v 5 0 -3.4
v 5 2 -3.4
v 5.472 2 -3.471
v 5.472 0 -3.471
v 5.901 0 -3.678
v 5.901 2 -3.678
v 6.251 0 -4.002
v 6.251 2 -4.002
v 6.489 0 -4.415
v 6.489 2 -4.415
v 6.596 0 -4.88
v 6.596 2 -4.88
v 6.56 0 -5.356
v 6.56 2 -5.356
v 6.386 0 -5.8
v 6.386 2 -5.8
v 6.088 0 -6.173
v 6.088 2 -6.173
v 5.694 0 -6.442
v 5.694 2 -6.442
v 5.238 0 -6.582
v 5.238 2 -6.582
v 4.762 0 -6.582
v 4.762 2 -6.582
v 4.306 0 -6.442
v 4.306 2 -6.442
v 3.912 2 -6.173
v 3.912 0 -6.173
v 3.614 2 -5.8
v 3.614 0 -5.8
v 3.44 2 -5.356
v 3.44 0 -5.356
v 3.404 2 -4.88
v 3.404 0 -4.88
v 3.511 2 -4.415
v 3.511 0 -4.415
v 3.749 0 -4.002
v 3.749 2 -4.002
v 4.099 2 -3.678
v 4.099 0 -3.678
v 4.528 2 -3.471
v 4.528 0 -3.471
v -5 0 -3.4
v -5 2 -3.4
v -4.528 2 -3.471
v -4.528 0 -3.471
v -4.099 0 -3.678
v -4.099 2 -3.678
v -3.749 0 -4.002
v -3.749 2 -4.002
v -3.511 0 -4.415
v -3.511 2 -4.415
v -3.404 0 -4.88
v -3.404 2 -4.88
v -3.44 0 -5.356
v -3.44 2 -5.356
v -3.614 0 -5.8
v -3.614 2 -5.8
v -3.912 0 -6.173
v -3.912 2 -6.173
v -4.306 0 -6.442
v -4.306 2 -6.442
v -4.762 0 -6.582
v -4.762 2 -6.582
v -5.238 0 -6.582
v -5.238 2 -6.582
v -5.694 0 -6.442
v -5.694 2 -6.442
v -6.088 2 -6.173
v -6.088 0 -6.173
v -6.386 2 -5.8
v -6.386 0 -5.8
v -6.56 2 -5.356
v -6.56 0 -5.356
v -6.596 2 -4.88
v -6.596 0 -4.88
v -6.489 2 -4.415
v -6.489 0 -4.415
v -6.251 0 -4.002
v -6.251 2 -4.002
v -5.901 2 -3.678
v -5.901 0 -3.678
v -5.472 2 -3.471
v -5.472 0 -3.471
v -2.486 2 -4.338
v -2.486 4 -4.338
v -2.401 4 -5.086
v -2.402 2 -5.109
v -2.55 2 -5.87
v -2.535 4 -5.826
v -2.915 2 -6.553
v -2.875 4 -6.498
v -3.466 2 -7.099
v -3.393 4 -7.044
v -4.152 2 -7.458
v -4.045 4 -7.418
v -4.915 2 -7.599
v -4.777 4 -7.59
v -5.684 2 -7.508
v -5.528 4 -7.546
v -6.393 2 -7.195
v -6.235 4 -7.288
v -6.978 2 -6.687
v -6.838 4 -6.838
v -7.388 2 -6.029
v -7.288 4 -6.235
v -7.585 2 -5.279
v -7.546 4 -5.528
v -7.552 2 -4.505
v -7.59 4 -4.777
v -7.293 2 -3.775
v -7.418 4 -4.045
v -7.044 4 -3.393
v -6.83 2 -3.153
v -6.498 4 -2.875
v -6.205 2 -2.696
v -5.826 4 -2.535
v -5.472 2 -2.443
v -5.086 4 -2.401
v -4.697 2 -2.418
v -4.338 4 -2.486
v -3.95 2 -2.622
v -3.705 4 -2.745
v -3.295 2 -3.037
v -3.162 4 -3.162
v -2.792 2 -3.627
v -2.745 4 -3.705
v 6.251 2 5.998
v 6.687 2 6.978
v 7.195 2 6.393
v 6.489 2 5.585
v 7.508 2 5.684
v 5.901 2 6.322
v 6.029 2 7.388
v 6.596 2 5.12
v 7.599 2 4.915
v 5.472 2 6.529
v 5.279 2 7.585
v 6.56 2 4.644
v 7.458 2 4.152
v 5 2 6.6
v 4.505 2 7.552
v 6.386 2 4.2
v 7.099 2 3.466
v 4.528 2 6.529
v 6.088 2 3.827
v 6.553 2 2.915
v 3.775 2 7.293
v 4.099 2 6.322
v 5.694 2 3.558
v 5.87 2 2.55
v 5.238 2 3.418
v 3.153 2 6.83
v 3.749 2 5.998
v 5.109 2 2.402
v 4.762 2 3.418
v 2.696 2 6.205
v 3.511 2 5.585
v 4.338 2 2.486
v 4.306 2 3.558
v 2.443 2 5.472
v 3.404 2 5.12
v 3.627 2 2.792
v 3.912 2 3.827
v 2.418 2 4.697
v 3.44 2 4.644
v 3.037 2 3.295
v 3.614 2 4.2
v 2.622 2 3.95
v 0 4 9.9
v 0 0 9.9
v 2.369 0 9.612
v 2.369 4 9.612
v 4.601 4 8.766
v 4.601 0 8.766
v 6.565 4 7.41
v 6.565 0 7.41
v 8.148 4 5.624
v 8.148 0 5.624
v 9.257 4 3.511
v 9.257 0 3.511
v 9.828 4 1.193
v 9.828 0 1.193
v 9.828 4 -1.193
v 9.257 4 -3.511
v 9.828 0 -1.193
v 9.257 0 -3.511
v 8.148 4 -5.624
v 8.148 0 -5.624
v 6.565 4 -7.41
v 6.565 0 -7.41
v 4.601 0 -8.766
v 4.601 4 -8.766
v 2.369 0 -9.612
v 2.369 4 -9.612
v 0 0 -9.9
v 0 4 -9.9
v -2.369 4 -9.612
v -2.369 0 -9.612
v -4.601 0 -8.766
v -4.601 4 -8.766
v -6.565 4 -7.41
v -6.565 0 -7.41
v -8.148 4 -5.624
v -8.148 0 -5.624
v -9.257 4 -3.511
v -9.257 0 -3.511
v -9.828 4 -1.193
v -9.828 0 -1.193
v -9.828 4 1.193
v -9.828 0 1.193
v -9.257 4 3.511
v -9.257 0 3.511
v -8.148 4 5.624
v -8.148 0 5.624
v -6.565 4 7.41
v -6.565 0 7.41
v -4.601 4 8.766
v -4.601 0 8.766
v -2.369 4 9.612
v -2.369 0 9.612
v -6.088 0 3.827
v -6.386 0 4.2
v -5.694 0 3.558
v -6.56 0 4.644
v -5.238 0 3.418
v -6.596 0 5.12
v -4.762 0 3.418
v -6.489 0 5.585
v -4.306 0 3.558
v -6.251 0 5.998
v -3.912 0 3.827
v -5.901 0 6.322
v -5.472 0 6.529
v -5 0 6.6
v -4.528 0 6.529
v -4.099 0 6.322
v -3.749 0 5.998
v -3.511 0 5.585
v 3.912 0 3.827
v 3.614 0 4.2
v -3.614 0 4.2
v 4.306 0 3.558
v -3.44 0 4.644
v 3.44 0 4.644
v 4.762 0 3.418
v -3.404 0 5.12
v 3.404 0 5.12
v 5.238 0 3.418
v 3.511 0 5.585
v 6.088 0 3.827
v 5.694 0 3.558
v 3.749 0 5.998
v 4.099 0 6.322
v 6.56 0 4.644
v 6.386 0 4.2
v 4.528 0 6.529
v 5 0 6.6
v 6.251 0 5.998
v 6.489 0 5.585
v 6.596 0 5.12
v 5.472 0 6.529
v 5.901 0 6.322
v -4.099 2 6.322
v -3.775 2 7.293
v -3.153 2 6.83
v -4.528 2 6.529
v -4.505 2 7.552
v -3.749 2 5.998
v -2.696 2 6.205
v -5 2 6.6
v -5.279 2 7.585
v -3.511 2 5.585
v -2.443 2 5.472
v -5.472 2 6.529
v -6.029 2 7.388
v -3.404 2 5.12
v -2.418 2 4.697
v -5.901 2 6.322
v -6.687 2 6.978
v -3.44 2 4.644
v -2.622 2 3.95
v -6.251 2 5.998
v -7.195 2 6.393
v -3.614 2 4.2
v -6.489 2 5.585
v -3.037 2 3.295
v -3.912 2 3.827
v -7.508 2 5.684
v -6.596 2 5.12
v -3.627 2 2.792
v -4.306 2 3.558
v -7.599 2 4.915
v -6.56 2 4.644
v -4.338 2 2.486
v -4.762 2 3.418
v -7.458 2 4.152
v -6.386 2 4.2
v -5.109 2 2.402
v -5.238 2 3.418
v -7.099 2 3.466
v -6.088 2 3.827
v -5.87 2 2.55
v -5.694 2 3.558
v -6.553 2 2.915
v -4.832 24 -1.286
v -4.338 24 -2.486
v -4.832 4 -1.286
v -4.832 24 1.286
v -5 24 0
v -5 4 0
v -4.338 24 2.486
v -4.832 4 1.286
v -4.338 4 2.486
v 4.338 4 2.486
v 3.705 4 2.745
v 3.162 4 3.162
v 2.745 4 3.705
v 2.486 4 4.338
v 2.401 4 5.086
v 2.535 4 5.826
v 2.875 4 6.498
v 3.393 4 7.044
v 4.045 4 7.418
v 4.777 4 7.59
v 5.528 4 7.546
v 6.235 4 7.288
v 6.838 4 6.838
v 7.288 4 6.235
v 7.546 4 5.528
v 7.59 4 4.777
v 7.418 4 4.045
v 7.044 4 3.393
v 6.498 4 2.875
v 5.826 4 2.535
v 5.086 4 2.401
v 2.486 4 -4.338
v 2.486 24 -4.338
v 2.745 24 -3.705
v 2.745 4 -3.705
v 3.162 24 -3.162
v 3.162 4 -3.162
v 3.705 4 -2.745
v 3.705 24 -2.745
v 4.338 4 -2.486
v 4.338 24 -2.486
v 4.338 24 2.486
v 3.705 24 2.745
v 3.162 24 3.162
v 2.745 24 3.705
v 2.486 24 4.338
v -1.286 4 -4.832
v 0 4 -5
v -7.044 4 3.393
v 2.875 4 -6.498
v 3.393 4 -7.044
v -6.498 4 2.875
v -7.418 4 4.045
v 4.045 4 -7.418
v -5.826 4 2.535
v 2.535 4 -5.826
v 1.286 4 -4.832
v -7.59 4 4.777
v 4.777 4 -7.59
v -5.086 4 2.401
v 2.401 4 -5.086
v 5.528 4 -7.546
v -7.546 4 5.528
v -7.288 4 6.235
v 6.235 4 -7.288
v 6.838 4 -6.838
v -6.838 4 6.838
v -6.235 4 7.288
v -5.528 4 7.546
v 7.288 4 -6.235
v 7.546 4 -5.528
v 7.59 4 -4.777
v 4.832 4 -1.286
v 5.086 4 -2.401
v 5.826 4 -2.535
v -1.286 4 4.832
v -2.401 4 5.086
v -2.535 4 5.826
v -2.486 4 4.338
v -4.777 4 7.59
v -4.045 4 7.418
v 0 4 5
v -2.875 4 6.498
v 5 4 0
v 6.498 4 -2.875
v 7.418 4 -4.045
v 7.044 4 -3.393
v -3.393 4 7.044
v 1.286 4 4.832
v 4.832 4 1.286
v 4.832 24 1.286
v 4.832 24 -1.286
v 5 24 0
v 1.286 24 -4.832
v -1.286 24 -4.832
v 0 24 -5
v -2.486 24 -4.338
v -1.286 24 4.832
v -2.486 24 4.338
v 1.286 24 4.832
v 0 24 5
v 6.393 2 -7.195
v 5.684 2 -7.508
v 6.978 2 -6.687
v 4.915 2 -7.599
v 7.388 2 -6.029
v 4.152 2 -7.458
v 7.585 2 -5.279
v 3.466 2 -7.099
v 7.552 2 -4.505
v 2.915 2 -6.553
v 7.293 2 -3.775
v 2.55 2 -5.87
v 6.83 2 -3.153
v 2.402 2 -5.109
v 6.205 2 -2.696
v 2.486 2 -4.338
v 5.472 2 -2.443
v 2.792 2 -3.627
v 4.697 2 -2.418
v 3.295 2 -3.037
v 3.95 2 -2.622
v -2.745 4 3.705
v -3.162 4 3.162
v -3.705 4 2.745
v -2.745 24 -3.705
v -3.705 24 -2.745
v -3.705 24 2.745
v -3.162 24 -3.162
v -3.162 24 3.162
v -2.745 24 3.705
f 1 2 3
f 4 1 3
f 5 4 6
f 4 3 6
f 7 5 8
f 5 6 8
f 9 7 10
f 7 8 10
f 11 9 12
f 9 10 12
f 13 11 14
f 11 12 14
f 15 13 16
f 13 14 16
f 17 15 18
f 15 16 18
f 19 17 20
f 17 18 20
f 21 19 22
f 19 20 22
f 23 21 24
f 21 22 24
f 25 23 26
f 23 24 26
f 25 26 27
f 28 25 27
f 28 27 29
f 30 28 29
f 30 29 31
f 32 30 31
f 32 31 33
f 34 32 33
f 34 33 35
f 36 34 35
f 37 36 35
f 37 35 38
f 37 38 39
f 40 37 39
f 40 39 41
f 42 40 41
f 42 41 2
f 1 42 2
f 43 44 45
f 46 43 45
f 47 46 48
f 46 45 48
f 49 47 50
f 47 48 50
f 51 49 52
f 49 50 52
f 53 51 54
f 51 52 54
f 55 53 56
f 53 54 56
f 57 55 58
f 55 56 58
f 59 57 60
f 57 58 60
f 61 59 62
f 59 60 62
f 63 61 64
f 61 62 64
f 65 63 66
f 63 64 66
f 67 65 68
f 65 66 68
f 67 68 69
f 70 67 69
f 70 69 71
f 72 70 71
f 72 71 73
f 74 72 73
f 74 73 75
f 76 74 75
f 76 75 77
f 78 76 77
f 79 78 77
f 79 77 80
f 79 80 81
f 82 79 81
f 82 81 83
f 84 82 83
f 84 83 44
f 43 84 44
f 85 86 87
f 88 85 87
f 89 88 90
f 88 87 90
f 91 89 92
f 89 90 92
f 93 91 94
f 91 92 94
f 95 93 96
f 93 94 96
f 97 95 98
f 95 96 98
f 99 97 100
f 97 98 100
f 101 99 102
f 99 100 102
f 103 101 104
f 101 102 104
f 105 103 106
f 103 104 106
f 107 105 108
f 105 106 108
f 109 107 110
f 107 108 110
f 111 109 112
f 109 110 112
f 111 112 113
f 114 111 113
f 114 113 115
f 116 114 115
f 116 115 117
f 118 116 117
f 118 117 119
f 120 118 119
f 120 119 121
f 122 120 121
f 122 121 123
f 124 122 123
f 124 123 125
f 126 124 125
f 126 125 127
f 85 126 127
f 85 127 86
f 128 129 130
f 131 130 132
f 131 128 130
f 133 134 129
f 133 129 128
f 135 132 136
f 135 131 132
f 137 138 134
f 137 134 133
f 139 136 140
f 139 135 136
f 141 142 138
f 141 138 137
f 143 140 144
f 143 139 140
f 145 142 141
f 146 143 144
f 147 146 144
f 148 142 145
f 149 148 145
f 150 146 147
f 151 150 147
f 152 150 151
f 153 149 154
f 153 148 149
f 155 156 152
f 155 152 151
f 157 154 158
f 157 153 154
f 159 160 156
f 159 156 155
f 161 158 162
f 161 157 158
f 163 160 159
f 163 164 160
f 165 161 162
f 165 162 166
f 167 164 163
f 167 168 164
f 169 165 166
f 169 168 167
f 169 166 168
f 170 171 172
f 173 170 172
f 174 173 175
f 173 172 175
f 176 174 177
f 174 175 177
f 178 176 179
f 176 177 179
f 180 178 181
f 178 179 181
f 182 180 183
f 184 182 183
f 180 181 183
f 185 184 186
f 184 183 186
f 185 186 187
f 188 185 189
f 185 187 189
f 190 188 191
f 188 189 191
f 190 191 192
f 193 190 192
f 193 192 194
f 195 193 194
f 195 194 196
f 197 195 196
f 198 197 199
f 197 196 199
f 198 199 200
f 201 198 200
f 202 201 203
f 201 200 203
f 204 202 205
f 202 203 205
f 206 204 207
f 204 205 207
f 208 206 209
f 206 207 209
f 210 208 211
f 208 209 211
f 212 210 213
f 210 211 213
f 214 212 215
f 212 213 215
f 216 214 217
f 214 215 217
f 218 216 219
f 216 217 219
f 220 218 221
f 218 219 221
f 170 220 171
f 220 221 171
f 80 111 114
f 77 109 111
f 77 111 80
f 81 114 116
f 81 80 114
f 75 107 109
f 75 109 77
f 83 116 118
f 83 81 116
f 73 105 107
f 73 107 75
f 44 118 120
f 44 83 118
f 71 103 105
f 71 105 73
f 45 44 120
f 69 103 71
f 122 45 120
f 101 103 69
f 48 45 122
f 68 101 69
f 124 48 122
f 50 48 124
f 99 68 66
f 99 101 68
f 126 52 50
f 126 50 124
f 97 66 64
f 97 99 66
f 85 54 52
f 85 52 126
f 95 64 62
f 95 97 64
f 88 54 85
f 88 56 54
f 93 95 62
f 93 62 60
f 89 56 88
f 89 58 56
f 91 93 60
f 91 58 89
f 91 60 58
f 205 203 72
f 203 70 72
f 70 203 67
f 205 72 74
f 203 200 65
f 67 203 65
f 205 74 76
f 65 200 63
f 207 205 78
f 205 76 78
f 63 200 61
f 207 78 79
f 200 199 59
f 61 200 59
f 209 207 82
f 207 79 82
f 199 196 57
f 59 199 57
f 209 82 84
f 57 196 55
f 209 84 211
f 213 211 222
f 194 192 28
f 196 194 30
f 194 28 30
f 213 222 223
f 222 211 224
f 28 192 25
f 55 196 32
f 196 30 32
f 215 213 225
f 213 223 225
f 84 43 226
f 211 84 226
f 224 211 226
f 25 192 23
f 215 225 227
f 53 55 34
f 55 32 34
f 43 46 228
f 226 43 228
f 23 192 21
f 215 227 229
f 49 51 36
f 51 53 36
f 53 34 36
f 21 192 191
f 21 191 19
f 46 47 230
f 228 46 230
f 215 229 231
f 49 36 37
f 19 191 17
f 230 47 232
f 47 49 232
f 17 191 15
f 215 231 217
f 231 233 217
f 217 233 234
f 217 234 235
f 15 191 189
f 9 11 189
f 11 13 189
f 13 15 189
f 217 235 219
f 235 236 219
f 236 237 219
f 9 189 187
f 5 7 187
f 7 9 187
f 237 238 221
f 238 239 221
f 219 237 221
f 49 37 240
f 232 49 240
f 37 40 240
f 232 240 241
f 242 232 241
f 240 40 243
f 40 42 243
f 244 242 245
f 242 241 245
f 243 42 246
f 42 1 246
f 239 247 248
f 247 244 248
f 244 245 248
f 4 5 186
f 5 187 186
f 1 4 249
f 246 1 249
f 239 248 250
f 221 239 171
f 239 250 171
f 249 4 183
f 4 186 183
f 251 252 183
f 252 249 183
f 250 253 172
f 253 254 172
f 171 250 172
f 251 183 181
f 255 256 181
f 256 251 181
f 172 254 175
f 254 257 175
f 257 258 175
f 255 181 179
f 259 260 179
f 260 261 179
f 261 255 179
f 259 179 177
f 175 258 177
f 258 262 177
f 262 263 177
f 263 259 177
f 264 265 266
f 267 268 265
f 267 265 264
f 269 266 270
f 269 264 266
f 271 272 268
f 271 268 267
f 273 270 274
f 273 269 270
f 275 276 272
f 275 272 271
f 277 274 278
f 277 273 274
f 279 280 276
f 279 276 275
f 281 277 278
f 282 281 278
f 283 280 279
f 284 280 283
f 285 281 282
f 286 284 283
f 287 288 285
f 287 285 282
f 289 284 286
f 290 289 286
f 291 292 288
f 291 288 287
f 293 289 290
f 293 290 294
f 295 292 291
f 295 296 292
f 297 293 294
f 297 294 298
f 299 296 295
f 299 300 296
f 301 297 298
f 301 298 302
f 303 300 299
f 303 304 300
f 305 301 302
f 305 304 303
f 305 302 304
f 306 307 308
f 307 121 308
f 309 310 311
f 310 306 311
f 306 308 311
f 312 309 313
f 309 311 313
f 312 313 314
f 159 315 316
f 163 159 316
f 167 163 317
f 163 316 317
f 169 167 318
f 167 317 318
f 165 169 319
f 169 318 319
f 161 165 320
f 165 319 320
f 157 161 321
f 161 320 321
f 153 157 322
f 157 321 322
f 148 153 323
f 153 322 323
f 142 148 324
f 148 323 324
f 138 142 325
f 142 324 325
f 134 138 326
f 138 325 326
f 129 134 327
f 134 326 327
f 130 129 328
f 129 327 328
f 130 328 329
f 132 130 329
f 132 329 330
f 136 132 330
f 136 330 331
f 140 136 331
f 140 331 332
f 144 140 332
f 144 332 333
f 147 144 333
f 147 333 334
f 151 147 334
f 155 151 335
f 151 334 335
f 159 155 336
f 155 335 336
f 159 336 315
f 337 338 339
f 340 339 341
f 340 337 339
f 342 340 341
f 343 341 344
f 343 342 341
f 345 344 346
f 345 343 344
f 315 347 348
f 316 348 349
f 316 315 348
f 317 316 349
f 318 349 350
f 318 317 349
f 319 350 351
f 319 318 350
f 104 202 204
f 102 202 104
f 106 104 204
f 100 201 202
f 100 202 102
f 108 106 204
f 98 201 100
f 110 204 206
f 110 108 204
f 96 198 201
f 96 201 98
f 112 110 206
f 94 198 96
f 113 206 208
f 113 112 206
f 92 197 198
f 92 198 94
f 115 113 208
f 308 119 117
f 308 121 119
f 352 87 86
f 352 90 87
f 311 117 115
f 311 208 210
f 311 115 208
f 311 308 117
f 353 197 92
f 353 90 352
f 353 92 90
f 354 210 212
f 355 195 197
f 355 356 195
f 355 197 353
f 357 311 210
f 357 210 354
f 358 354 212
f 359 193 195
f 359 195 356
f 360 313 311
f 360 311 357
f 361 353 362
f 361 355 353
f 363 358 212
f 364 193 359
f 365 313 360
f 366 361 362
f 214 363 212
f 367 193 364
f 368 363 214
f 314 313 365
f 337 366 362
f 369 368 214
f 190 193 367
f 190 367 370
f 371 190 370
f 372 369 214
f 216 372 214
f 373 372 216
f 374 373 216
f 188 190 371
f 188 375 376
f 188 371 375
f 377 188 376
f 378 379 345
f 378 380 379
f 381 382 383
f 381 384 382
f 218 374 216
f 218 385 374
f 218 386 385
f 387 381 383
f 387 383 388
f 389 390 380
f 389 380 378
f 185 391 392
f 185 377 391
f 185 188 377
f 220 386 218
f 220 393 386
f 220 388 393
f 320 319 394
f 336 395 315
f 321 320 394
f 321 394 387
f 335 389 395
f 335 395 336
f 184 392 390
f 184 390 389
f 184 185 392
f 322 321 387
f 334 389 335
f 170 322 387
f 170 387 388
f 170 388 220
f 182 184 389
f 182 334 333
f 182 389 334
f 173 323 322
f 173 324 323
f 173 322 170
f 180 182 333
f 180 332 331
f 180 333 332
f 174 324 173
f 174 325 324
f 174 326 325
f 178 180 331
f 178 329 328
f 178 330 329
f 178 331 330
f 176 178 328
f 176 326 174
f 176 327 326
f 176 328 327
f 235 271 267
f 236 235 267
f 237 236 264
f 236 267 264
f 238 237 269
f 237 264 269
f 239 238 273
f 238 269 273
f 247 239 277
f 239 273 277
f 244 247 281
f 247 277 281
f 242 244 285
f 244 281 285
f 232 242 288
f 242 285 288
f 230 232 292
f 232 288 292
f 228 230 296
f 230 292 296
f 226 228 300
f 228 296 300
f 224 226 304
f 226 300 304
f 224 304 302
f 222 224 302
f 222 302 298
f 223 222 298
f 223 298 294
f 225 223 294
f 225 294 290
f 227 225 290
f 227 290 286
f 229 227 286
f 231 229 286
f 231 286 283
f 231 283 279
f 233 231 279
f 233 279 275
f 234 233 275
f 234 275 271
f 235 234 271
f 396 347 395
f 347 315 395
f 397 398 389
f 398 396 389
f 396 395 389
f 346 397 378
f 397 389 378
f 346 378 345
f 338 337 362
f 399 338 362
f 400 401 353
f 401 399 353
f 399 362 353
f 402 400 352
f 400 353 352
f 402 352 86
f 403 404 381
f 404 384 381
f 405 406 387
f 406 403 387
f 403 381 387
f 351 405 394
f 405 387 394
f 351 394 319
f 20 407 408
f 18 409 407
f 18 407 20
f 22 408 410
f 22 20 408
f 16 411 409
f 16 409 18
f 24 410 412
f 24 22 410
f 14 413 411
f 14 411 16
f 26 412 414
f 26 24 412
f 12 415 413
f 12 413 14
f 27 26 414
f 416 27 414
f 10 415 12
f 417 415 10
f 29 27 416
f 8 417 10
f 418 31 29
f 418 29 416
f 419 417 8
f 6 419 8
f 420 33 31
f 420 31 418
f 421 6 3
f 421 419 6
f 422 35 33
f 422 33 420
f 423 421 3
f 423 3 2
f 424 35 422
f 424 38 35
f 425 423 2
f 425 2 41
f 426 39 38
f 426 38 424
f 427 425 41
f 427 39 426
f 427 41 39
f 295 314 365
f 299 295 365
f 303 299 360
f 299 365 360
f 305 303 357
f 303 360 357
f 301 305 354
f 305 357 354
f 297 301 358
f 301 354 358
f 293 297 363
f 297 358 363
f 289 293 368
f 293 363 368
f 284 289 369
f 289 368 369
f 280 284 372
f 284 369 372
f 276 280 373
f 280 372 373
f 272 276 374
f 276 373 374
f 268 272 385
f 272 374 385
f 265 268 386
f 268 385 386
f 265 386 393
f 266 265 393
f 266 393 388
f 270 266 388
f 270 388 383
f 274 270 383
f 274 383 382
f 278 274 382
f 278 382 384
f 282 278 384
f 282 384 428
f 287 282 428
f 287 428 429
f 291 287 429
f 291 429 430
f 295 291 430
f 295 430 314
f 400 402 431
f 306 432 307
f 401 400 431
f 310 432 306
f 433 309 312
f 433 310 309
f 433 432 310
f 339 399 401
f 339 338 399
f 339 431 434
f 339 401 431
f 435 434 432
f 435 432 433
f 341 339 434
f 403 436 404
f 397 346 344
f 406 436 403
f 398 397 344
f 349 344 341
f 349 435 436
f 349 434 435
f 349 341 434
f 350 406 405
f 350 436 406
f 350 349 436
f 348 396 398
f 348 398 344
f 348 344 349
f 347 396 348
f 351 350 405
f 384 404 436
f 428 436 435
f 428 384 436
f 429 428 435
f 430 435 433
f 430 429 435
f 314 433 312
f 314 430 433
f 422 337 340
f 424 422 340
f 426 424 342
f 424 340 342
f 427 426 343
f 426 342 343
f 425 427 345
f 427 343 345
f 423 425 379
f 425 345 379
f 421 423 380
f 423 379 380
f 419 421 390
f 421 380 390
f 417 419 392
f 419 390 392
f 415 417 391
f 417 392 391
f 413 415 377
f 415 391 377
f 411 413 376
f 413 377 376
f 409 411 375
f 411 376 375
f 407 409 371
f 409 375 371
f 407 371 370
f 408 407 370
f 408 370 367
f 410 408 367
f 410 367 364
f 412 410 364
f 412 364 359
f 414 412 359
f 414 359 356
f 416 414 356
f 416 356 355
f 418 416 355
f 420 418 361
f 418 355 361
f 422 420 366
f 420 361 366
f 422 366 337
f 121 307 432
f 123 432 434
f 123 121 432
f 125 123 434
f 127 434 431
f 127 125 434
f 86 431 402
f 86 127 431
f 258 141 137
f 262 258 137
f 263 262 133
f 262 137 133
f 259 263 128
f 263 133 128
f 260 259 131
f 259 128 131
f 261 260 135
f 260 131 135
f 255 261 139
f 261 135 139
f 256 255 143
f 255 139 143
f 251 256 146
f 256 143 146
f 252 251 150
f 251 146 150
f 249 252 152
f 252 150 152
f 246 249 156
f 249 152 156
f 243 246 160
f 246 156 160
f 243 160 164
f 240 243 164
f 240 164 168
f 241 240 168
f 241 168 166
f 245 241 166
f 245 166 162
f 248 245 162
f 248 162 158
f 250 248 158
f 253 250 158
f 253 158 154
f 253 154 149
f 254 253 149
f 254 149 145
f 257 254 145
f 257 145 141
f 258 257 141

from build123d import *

# Parameters (mm, degrees)
SKETCH1_R           = 9.9
BOSS_EXTRUDE1_DEPTH = 4
SKETCH2_R           = 5
BOSS_EXTRUDE2_DEPTH = 20
CUT_EXTRUDE1_REACH  = 26.414
SKETCH3_R           = 1.6
CUT_EXTRUDE2_REACH  = 26.414
SKETCH3_3_R         = 2.6
SKETCH3_3_R_2       = 1.6
SKETCH3_4_R         = 2.6
SKETCH3_4_R_2       = 1.6
CUT_EXTRUDE3_DEPTH  = 2


with BuildPart() as part:
    # Sketch1 → Boss-Extrude1 (new body)
    with BuildSketch(Plane(origin=(0, 0, 0), x_dir=(1, 0, 0), z_dir=(0, 1, 0))):
        Circle(SKETCH1_R)
    extrude(amount=BOSS_EXTRUDE1_DEPTH)

    # Sketch2 → Boss-Extrude2 (add)
    with BuildSketch(Plane(origin=(0, 4, 0), x_dir=(1, 0, 0), z_dir=(0, 1, 0))):
        Circle(SKETCH2_R)
    extrude(amount=BOSS_EXTRUDE2_DEPTH)

    # Sketch3 → Cut-Extrude1 (cut, up to next)
    with BuildSketch(Plane(origin=(0, 4, 0), x_dir=(1, 0, 0), z_dir=(0, 1, 0)), mode=Mode.PRIVATE) as cut_extrude1_sk1:
        with Locations((-5, 5)):
            Circle(SKETCH3_R)
    cut_extrude1_tool1 = extrude(cut_extrude1_sk1.sketch, amount=-CUT_EXTRUDE1_REACH, mode=Mode.PRIVATE) & part.part
    # Sketch3 → Cut-Extrude1 (cut, up to next)
    with BuildSketch(Plane(origin=(0, 4, 0), x_dir=(1, 0, 0), z_dir=(0, 1, 0)), mode=Mode.PRIVATE) as cut_extrude1_sk2:
        with Locations((5, 5)):
            Circle(SKETCH3_R)
    cut_extrude1_tool2 = extrude(cut_extrude1_sk2.sketch, amount=-CUT_EXTRUDE1_REACH, mode=Mode.PRIVATE) & part.part
    # Sketch3 → Cut-Extrude1 (cut, up to next)
    with BuildSketch(Plane(origin=(0, 4, 0), x_dir=(1, 0, 0), z_dir=(0, 1, 0)), mode=Mode.PRIVATE) as cut_extrude1_sk3:
        with Locations((5, -5)):
            Circle(SKETCH3_R)
    cut_extrude1_tool3 = extrude(cut_extrude1_sk3.sketch, amount=-CUT_EXTRUDE1_REACH, mode=Mode.PRIVATE) & part.part
    # Sketch3 → Cut-Extrude1 (cut, up to next)
    with BuildSketch(Plane(origin=(0, 4, 0), x_dir=(1, 0, 0), z_dir=(0, 1, 0)), mode=Mode.PRIVATE) as cut_extrude1_sk4:
        with Locations((-5, -5)):
            Circle(SKETCH3_R)
    cut_extrude1_tool4 = extrude(cut_extrude1_sk4.sketch, amount=-CUT_EXTRUDE1_REACH, mode=Mode.PRIVATE) & part.part
    add(cut_extrude1_tool1.solids().sort_by_distance((-5, 4, -5))[0], mode=Mode.SUBTRACT)
    add(cut_extrude1_tool2.solids().sort_by_distance((5, 4, -5))[0], mode=Mode.SUBTRACT)
    add(cut_extrude1_tool3.solids().sort_by_distance((5, 4, 5))[0], mode=Mode.SUBTRACT)
    add(cut_extrude1_tool4.solids().sort_by_distance((-5, 4, 5))[0], mode=Mode.SUBTRACT)

    # Sketch3<3> → Cut-Extrude2 (cut, up to next)
    with BuildSketch(Plane(origin=(0, 4, 0), x_dir=(1, 0, 0), z_dir=(0, 1, 0)), mode=Mode.PRIVATE) as cut_extrude2_sk1:
        with Locations((5, 5)):
            Circle(SKETCH3_3_R)
        with Locations((5, 5)):
            Circle(SKETCH3_3_R_2, mode=Mode.SUBTRACT)
    cut_extrude2_tool1 = extrude(cut_extrude2_sk1.sketch, amount=CUT_EXTRUDE2_REACH, mode=Mode.PRIVATE) & part.part
    # Sketch3<3> → Cut-Extrude2 (cut, up to next)
    with BuildSketch(Plane(origin=(0, 4, 0), x_dir=(1, 0, 0), z_dir=(0, 1, 0)), mode=Mode.PRIVATE) as cut_extrude2_sk2:
        with Locations((-5, 5)):
            Circle(SKETCH3_3_R)
        with Locations((-5, 5)):
            Circle(SKETCH3_3_R_2, mode=Mode.SUBTRACT)
    cut_extrude2_tool2 = extrude(cut_extrude2_sk2.sketch, amount=CUT_EXTRUDE2_REACH, mode=Mode.PRIVATE) & part.part
    # Sketch3<3> → Cut-Extrude2 (cut, up to next)
    with BuildSketch(Plane(origin=(0, 4, 0), x_dir=(1, 0, 0), z_dir=(0, 1, 0)), mode=Mode.PRIVATE) as cut_extrude2_sk3:
        with Locations((-5, -5)):
            Circle(SKETCH3_3_R)
        with Locations((-5, -5)):
            Circle(SKETCH3_3_R_2, mode=Mode.SUBTRACT)
    cut_extrude2_tool3 = extrude(cut_extrude2_sk3.sketch, amount=CUT_EXTRUDE2_REACH, mode=Mode.PRIVATE) & part.part
    # Sketch3<3> → Cut-Extrude2 (cut, up to next)
    with BuildSketch(Plane(origin=(0, 4, 0), x_dir=(1, 0, 0), z_dir=(0, 1, 0)), mode=Mode.PRIVATE) as cut_extrude2_sk4:
        with Locations((5, -5)):
            Circle(SKETCH3_3_R)
        with Locations((5, -5)):
            Circle(SKETCH3_3_R_2, mode=Mode.SUBTRACT)
    cut_extrude2_tool4 = extrude(cut_extrude2_sk4.sketch, amount=CUT_EXTRUDE2_REACH, mode=Mode.PRIVATE) & part.part
    add(cut_extrude2_tool1.solids().sort_by_distance((2.473539, 4, -5))[0], mode=Mode.SUBTRACT)
    add(cut_extrude2_tool2.solids().sort_by_distance((-7.526461, 4, -5))[0], mode=Mode.SUBTRACT)
    add(cut_extrude2_tool3.solids().sort_by_distance((-7.526461, 4, 5))[0], mode=Mode.SUBTRACT)
    add(cut_extrude2_tool4.solids().sort_by_distance((2.473539, 4, 5))[0], mode=Mode.SUBTRACT)

    # Sketch3<4> → Cut-Extrude3 (cut)
    # profile 1 of 4: a face of its own
    with BuildSketch(Plane(origin=(0, 4, 0), x_dir=(1, 0, 0), z_dir=(0, 1, 0))):
        with Locations((5, 5)):
            Circle(SKETCH3_4_R)
        with Locations((5, 5)):
            Circle(SKETCH3_4_R_2, mode=Mode.SUBTRACT)
    # profile 2 of 4: a face of its own
    with BuildSketch(Plane(origin=(0, 4, 0), x_dir=(1, 0, 0), z_dir=(0, 1, 0))):
        with Locations((-5, 5)):
            Circle(SKETCH3_4_R)
        with Locations((-5, 5)):
            Circle(SKETCH3_4_R_2, mode=Mode.SUBTRACT)
    # profile 3 of 4: a face of its own
    with BuildSketch(Plane(origin=(0, 4, 0), x_dir=(1, 0, 0), z_dir=(0, 1, 0))):
        with Locations((-5, -5)):
            Circle(SKETCH3_4_R)
        with Locations((-5, -5)):
            Circle(SKETCH3_4_R_2, mode=Mode.SUBTRACT)
    # profile 4 of 4: a face of its own
    with BuildSketch(Plane(origin=(0, 4, 0), x_dir=(1, 0, 0), z_dir=(0, 1, 0))):
        with Locations((5, -5)):
            Circle(SKETCH3_4_R)
        with Locations((5, -5)):
            Circle(SKETCH3_4_R_2, mode=Mode.SUBTRACT)
    extrude(amount=-CUT_EXTRUDE3_DEPTH, mode=Mode.SUBTRACT)


solid = part.part
